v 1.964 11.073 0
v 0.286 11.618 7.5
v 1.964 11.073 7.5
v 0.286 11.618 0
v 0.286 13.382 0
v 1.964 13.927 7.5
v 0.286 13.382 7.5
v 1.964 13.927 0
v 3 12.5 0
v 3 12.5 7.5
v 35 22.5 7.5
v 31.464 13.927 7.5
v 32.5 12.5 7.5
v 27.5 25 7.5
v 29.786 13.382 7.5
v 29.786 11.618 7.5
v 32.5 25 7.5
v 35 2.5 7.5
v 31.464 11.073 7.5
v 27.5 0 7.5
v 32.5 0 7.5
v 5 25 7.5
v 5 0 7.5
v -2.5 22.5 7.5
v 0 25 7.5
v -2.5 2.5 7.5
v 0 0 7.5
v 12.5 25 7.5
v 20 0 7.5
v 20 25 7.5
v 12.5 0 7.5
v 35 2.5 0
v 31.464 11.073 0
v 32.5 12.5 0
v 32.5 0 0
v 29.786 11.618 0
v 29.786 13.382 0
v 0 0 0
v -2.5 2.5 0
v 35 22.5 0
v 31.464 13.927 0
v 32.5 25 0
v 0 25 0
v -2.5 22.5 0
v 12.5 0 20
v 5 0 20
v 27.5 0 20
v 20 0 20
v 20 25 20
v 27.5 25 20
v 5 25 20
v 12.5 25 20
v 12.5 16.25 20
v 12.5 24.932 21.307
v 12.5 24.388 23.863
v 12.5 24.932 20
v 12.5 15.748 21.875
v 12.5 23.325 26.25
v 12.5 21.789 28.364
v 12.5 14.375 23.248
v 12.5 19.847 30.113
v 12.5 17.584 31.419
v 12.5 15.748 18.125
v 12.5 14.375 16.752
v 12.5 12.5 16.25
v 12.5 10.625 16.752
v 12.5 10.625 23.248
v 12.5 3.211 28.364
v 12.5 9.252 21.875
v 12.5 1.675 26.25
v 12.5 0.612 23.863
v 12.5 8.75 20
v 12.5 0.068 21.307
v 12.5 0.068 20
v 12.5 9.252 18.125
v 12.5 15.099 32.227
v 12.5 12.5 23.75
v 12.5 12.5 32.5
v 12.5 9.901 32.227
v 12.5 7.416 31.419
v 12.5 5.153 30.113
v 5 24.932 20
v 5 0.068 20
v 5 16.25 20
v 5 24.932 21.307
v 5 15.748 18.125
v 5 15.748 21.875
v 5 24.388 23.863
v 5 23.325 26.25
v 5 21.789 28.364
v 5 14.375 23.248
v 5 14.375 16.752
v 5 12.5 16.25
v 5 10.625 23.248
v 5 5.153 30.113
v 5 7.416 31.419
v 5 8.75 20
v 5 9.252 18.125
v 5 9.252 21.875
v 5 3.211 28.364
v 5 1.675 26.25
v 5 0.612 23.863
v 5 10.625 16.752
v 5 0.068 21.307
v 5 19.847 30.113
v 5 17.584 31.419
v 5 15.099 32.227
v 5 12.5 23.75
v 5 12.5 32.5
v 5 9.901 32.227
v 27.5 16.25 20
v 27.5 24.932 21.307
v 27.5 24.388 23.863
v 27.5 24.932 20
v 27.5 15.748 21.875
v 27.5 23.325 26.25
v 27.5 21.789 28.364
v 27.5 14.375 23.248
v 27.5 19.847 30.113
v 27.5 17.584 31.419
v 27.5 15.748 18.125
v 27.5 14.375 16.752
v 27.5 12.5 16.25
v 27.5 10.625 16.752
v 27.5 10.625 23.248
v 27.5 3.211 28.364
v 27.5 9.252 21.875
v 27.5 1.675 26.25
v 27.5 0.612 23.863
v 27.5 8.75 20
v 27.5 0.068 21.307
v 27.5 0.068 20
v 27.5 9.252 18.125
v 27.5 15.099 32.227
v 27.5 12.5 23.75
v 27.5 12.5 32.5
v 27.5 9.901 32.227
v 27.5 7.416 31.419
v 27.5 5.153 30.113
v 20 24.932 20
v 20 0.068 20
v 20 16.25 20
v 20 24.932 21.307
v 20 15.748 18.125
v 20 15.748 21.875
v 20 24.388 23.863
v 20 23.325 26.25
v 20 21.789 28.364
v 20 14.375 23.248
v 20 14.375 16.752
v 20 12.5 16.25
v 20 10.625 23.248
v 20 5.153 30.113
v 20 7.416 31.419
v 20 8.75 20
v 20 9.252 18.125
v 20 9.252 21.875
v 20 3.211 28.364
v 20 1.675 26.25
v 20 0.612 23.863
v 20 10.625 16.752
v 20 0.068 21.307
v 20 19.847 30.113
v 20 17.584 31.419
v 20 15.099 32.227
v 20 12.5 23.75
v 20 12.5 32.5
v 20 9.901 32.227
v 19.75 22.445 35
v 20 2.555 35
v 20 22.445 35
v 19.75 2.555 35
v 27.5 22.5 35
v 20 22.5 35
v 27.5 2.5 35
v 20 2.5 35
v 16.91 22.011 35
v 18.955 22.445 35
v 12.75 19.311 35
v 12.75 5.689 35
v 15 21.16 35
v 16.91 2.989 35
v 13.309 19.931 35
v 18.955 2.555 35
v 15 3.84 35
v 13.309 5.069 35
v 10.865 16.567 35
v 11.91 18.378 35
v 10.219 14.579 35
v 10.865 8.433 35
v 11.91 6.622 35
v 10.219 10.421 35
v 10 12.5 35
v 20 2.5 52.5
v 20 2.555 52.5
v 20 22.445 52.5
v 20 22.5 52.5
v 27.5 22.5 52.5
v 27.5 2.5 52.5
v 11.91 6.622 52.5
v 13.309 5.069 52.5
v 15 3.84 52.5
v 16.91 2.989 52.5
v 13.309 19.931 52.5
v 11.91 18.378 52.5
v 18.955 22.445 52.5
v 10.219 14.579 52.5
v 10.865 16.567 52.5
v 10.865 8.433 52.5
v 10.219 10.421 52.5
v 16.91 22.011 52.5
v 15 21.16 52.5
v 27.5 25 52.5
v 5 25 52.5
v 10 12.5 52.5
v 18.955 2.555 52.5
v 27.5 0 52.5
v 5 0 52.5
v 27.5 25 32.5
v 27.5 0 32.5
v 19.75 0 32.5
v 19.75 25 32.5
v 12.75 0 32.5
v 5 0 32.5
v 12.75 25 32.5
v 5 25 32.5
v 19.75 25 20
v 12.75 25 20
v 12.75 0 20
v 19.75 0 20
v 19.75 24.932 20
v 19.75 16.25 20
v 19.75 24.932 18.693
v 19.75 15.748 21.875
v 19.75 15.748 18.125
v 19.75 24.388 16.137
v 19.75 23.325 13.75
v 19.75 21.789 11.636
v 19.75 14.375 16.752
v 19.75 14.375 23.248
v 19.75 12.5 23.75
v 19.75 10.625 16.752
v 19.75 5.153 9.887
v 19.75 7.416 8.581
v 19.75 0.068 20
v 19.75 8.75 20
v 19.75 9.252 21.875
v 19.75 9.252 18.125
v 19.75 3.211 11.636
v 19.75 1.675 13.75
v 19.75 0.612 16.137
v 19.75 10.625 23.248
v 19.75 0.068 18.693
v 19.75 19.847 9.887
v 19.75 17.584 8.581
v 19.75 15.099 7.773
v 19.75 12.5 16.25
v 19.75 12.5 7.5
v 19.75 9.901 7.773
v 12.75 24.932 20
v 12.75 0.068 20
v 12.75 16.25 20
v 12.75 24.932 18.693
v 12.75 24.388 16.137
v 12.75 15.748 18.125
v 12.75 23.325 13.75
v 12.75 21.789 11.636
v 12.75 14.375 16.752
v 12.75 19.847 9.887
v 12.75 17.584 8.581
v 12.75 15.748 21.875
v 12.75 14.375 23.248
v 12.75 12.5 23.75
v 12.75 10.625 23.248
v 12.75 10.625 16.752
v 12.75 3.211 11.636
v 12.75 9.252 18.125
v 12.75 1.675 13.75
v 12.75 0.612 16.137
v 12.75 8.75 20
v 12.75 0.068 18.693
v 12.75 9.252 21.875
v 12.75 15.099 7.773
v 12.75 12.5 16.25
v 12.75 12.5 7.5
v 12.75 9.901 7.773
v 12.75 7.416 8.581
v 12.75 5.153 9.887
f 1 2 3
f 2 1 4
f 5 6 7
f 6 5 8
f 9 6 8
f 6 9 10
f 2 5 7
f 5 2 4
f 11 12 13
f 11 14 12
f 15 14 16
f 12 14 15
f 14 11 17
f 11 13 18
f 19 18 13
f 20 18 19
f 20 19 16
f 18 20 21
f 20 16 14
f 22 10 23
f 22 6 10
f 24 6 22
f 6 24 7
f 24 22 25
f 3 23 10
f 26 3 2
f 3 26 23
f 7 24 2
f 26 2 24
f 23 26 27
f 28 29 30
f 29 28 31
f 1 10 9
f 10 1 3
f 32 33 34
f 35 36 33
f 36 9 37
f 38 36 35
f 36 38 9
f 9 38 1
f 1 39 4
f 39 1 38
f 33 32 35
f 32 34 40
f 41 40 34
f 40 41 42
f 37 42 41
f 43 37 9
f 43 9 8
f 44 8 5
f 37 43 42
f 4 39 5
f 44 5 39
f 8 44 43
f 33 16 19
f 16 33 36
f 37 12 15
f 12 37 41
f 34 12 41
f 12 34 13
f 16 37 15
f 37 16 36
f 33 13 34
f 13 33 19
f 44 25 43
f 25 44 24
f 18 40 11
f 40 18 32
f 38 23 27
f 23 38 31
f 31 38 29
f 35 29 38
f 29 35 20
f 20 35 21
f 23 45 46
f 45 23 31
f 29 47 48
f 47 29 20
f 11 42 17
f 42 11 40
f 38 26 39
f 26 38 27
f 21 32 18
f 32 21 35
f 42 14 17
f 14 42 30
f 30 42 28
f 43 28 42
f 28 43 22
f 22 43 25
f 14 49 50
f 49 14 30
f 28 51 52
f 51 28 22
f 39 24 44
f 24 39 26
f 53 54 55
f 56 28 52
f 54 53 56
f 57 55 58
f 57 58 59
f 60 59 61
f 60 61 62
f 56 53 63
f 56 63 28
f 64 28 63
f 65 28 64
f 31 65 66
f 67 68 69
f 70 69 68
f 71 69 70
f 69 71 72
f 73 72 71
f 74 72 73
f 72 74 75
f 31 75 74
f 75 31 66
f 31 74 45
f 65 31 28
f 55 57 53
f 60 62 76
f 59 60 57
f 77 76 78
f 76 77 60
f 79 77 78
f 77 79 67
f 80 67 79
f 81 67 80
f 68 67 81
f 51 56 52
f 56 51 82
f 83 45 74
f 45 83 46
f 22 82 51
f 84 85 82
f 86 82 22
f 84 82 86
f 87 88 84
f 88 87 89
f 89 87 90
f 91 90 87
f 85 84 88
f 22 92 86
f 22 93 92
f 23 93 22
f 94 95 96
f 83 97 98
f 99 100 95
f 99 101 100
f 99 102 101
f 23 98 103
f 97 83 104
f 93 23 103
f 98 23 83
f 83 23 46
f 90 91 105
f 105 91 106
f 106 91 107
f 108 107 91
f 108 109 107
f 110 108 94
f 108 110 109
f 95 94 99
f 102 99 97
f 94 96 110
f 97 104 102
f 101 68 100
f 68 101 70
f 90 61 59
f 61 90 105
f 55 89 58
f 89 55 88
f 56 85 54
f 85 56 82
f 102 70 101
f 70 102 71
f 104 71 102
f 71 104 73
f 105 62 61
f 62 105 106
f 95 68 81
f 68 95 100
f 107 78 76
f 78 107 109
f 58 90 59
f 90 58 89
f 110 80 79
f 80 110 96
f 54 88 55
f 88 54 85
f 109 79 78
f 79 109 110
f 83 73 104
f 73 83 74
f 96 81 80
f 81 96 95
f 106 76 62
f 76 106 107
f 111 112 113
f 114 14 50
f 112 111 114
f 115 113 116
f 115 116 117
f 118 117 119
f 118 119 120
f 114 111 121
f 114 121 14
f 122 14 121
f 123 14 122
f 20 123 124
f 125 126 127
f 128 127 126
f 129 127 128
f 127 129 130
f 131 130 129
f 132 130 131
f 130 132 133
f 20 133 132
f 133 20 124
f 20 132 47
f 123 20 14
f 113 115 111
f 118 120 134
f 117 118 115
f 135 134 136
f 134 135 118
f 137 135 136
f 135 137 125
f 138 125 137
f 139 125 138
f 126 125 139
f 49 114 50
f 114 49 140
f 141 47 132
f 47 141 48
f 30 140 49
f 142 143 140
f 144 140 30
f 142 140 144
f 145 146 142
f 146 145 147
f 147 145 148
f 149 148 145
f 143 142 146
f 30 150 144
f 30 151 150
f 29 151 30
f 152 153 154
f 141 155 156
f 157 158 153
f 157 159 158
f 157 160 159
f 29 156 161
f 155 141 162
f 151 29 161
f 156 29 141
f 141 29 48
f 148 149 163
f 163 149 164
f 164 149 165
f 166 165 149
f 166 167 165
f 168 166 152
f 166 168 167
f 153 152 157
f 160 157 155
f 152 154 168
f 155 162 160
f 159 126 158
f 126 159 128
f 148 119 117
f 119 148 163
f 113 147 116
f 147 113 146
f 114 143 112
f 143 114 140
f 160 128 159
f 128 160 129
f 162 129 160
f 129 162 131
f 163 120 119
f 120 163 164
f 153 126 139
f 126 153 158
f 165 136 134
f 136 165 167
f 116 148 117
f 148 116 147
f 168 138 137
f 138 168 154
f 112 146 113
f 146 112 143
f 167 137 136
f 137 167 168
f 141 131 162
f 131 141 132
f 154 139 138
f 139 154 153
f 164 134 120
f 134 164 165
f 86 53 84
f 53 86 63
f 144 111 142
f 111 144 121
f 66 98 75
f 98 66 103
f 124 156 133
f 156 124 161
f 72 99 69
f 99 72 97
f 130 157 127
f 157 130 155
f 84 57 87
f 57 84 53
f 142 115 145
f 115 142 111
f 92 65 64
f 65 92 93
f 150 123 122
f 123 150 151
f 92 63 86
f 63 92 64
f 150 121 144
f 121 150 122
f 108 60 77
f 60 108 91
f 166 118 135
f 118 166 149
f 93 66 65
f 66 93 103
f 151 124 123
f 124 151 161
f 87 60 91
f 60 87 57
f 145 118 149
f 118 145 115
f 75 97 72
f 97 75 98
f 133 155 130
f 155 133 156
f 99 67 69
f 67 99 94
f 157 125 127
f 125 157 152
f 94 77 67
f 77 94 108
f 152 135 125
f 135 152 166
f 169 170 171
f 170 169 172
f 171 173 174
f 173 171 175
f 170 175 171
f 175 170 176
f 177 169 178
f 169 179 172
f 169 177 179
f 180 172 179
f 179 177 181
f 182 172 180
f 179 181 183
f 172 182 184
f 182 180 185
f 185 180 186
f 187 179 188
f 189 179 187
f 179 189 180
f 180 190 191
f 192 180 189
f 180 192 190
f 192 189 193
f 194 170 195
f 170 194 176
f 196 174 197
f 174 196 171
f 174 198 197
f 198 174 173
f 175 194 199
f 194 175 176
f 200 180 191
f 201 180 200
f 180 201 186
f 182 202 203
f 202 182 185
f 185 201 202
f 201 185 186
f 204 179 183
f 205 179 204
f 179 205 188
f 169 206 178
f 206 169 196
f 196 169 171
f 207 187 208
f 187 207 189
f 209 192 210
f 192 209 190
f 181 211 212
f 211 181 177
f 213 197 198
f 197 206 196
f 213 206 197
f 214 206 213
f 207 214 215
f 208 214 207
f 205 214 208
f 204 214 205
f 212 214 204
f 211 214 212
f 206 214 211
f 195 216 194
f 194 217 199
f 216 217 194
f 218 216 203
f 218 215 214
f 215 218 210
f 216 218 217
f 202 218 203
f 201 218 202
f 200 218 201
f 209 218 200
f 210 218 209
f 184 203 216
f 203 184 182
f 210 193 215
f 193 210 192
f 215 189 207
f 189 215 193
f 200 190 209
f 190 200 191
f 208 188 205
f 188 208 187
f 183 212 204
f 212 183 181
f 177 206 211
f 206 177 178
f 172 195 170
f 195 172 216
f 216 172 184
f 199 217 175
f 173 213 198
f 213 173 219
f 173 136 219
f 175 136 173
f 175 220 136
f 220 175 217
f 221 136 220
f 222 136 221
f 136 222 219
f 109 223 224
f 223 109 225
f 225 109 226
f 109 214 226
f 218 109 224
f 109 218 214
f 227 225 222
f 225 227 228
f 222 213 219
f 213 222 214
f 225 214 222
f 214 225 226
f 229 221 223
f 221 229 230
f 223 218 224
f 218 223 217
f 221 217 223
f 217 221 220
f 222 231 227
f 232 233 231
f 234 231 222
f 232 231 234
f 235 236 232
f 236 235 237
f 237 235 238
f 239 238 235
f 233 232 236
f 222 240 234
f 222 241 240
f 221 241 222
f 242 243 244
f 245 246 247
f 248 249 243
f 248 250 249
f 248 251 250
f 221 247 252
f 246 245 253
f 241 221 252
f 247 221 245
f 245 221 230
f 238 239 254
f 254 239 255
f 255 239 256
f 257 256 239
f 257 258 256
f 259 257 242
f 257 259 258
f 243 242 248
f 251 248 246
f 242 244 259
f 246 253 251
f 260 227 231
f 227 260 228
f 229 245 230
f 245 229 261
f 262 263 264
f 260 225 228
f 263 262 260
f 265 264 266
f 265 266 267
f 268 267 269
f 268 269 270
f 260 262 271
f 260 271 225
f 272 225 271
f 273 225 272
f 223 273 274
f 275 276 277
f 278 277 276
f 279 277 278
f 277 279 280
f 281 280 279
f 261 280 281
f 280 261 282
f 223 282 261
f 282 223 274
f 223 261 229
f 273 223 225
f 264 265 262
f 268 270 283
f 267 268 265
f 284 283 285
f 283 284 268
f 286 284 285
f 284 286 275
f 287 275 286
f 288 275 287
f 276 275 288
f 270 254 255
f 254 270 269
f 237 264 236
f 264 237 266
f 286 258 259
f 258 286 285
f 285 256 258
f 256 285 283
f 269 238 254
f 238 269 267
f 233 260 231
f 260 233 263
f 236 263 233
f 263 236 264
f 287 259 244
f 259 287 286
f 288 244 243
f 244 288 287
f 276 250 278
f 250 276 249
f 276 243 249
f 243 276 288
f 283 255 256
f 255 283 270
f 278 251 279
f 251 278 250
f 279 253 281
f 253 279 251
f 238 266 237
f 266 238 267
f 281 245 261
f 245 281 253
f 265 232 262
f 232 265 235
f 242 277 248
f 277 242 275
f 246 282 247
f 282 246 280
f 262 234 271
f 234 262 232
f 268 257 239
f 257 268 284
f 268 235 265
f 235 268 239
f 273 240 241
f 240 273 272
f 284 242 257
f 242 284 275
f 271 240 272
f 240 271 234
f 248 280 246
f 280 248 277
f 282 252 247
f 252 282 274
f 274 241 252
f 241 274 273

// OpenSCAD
thickness = 7.5;
hole_d = 20;
space =2.5;
screw_h = 7.5;

module base(){
    difference(){
    hull(){    
    cube([(3*thickness)+(4*space),hole_d+(2*space),thickness]);
    translate([-space,space,0])cube([(3*thickness)+(6*space),hole_d,thickness]);
    }
    union(){
    translate([1.5,(hole_d+(2*space))/2,0]) cylinder(d=3,h=thickness);    
    translate([(3*thickness)+(4*space)-1.5,(hole_d+(2*space))/2,0]) cylinder(d=3,h=thickness);    
    }}
    
    difference(){
    union(){
    //hinges
    translate([2*space,0,thickness]) cube([thickness,hole_d+(2*space),(hole_d+(2*space))/2]);
    translate([2*space,(hole_d/2)+space,hole_d]) rotate([0,90,0]) cylinder(d=hole_d+(2*space),h=thickness);
    translate([(2*space)+(2*thickness),0,thickness]) cube([thickness,hole_d+(2*space),(hole_d+(2*space))/2]);
    translate([2*space+(2*thickness),(hole_d/2)+space,hole_d]) rotate([0,90,0]) cylinder(d=hole_d+(2*space),h=thickness);
    }
    translate([0,(hole_d/2)+space,hole_d]) rotate([0,90,0]) cylinder(d=screw_h,h=(3*thickness)+(4*space));
}
}

module holder(){
    
    difference(){
    translate([(2*space),0,thickness+hole_d+(2*space)]) cube([3*thickness,hole_d+(2*space),hole_d]);
    translate([hole_d,(hole_d/2)+space,thickness+hole_d+(3*space)]){
        translate([0,-hole_d/2,0])cube([hole_d,hole_d,hole_d+space]);
        cylinder(d=hole_d,h=hole_d-space);
    }
    }
    difference(){
    union(){
    translate([(2*space)+(thickness)+0.25,0,(hole_d)]) cube([thickness-0.5,hole_d+(2*space),(hole_d/2)+(2*space)]);
    translate([2*space+(thickness)+0.25,(hole_d/2)+space,hole_d]) rotate([0,90,0]) cylinder(d=hole_d+(2*space),h=thickness-0.5);
    }
    translate([0,(hole_d/2)+space,hole_d]) rotate([0,90,0]) cylinder(d=screw_h,h=(3*thickness)+(4*space));
    }
    
}

base();
holder();
